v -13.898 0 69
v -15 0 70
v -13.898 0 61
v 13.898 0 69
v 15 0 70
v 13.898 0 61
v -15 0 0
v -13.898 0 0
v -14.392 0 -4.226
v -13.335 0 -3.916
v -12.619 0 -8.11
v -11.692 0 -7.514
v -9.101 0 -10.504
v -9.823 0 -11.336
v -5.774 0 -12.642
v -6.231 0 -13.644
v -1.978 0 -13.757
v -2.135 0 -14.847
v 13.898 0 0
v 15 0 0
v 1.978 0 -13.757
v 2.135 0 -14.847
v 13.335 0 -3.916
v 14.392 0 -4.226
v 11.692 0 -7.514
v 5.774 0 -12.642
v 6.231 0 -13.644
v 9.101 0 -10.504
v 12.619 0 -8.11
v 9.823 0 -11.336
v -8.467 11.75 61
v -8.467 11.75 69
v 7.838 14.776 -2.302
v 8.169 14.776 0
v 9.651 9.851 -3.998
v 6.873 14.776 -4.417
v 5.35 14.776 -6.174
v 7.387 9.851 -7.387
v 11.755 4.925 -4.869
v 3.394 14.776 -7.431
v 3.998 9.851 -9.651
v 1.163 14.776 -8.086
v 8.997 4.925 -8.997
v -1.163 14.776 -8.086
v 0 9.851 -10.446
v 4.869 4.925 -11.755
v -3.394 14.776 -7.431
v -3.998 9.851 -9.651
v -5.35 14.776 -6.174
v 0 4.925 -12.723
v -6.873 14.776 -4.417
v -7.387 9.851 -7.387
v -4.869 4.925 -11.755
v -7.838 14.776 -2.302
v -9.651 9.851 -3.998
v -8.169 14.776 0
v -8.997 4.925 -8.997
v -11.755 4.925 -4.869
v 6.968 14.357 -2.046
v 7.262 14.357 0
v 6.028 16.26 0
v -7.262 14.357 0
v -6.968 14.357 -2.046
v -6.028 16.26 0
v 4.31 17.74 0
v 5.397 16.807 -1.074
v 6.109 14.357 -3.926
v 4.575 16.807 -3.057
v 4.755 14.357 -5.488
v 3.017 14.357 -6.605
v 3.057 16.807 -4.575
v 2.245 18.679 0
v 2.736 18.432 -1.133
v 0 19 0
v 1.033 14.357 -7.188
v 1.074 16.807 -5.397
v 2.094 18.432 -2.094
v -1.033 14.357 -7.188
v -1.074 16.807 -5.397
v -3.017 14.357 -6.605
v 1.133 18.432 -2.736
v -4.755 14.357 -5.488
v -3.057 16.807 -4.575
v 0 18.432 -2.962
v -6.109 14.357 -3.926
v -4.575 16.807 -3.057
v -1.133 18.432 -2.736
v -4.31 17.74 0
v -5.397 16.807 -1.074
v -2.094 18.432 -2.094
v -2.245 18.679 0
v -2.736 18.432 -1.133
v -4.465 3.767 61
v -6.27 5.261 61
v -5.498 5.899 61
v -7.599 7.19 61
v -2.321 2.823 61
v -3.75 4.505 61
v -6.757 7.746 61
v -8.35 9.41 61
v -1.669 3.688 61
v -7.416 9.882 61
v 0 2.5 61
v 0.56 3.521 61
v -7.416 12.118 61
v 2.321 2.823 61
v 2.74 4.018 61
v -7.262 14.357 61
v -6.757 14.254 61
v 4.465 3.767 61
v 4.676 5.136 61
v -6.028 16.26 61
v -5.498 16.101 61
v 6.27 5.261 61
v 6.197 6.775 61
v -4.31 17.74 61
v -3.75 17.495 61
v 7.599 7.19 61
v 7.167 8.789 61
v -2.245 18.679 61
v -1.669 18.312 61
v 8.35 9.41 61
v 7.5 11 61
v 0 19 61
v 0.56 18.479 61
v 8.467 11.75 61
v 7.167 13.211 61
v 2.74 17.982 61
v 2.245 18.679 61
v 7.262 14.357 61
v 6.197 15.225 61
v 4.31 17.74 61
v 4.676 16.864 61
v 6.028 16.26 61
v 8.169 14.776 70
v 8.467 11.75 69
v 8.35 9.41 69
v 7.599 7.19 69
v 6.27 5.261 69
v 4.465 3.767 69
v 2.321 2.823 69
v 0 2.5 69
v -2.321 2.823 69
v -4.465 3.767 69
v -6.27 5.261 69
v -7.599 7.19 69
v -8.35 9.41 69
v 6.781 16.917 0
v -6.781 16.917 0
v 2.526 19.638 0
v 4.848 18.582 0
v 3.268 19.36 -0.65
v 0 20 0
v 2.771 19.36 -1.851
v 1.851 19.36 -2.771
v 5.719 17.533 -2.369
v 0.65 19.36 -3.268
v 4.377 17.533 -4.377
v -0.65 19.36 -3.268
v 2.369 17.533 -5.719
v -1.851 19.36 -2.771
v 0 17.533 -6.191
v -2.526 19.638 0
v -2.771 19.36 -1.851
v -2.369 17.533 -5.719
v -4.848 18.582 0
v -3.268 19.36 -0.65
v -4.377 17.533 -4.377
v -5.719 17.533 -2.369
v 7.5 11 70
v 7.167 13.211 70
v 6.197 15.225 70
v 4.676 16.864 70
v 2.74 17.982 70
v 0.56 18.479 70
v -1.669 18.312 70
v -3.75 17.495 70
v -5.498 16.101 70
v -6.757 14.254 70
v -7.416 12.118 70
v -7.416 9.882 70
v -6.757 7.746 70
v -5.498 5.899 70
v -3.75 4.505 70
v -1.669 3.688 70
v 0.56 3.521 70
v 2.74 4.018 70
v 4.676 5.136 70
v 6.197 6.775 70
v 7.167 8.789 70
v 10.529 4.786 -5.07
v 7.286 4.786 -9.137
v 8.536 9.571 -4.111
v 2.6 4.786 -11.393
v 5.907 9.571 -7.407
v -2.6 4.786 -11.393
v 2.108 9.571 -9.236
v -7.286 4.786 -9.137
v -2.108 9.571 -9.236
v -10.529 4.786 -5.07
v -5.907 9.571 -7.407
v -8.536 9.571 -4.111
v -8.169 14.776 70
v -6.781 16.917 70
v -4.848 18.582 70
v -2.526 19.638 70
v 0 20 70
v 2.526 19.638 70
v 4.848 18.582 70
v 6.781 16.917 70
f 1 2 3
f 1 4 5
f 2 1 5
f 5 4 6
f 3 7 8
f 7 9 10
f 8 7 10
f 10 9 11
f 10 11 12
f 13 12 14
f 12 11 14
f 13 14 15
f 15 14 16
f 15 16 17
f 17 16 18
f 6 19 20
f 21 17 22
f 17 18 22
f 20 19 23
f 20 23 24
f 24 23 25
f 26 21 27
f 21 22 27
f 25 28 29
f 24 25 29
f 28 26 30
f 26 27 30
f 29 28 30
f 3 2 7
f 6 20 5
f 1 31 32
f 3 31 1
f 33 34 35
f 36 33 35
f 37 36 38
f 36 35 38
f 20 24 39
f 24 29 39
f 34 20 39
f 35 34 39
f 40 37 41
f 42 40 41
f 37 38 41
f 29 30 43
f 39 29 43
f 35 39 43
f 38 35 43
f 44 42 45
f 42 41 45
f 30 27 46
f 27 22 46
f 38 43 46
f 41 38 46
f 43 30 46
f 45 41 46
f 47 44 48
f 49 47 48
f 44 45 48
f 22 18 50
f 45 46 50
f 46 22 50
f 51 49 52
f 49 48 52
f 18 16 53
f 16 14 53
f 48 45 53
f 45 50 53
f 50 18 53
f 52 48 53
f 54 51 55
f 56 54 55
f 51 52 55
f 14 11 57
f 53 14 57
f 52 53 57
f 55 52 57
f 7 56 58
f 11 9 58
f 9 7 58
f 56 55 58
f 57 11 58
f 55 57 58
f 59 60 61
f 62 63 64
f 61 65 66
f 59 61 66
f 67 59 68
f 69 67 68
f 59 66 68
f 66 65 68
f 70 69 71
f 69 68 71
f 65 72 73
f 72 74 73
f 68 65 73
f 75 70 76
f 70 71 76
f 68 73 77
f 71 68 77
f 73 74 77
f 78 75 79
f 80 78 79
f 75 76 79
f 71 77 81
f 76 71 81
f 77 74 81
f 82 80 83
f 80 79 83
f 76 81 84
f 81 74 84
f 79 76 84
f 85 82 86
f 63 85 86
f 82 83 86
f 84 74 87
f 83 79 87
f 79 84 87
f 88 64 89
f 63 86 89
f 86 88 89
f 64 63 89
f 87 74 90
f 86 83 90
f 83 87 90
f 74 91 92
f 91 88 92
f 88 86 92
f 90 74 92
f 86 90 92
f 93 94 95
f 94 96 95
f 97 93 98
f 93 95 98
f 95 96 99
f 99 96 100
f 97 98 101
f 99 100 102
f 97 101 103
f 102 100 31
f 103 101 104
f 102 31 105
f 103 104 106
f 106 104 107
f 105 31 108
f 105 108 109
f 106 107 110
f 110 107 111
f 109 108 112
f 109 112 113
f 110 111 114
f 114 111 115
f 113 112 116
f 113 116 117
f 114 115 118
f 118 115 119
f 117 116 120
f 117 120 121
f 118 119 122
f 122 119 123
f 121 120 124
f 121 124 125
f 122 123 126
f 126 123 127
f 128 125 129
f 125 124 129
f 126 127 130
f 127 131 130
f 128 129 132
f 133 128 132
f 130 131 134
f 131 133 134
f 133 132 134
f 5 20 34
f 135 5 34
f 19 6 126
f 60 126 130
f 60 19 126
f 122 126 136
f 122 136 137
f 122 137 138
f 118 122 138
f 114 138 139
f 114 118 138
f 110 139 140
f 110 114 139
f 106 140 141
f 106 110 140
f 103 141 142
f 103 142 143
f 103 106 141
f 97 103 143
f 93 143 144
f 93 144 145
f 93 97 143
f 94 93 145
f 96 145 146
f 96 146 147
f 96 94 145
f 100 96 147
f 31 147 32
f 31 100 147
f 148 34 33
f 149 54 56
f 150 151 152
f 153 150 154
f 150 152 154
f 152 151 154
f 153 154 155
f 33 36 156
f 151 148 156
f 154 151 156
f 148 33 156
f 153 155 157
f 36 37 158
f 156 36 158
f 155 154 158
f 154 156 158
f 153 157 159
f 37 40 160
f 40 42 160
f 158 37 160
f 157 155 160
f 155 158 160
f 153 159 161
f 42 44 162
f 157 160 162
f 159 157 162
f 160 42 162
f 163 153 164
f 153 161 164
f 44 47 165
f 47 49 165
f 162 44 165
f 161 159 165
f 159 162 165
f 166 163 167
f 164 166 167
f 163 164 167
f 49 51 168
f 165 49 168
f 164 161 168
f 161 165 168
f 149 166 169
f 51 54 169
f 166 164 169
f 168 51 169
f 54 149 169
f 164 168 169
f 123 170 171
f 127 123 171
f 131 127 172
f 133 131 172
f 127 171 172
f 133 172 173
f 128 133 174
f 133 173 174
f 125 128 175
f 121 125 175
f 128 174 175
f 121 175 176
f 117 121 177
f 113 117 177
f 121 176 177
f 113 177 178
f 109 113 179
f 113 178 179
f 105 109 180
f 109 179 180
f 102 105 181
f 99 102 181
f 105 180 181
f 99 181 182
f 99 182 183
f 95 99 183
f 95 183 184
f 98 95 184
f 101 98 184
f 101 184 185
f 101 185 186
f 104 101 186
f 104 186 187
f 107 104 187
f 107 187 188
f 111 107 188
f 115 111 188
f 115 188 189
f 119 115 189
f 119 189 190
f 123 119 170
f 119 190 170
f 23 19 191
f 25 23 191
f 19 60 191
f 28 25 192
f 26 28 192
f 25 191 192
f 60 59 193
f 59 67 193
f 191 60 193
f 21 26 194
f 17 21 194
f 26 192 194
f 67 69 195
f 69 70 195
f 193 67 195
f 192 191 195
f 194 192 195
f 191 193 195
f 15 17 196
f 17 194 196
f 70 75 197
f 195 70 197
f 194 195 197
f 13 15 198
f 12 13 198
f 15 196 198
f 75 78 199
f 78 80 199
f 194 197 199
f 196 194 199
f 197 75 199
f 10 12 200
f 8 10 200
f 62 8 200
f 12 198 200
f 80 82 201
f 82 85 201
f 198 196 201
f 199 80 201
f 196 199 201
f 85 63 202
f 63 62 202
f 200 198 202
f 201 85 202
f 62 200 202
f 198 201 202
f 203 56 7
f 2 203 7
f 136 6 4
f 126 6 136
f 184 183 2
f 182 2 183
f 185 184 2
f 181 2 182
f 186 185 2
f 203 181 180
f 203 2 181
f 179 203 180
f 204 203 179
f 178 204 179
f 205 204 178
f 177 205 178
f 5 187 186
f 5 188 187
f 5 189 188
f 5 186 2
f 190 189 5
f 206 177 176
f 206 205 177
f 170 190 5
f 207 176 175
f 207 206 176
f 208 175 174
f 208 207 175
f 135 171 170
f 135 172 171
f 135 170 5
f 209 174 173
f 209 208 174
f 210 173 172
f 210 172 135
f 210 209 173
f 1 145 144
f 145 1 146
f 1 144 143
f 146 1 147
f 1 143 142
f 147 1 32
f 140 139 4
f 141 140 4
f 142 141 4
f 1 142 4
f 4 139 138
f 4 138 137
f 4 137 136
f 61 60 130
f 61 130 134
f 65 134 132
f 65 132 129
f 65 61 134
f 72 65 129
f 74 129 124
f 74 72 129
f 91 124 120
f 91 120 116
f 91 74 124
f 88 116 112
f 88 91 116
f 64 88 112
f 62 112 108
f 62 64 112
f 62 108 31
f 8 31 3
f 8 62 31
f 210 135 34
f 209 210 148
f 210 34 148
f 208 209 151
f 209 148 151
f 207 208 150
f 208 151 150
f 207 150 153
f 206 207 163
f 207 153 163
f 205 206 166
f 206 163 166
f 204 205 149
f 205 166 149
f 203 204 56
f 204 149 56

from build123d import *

# Parameters (mm, degrees)
REVOLVE1_ANGLE      = 180
BOSS_EXTRUDE1_DEPTH = 70
SKETCH4_R           = 7.5
CUT_EXTRUDE1_DEPTH  = 9
SHELL1_DEPTH        = 61
SHELL1_START        = 61
SHELL1_2_DEPTH      = 8
SHELL1_3_ANGLE      = 180


with BuildPart() as part:
    # Sketch2 → Revolve1 (revolve)
    with BuildSketch(Plane.XY):
        with BuildLine():
            Line((0, 0), (0, 20))
            ThreePointArc((0, 20), (4.848310738, 18.582472089), (8.169373523, 14.776418441))
            Line((8.169373523, 14.776418441), (15, 0))
            Line((15, 0), (0, 0))
        make_face()
    revolve(axis=Axis((0, 0, 0), (0, 1, 0)), revolution_arc=REVOLVE1_ANGLE)

    # Sketch3 → Boss-Extrude1 (add)
    with BuildSketch(Plane.XY):
        with BuildLine():
            Line((-15, 0), (15, 0))
            Line((15, 0), (8.169373523, 14.776418441))
            ThreePointArc((8.169373523, 14.776418441), (0, 20), (-8.169373523, 14.776418441))
            Line((-8.169373523, 14.776418441), (-15, 0))
        make_face()
    extrude(amount=BOSS_EXTRUDE1_DEPTH)

    # Sketch4 → Cut-Extrude1 (cut)
    with BuildSketch(Plane.XY.offset(70)):
        with Locations((0, 11)):
            Circle(SKETCH4_R)
    extrude(amount=-CUT_EXTRUDE1_DEPTH, mode=Mode.SUBTRACT)

    # Shell1: read off the stored shape, not the designer's step
    # Shell1 outline → Shell1 (cut)
    with BuildSketch(Plane.XY):
        with BuildLine():
            Line((-13.898324336, 0), (13.898324336, 0))
            Line((13.898324336, 0), (7.261665354, 14.356816392))
            ThreePointArc((7.261665354, 14.356816392), (0, 19), (-7.261665354, 14.356816392))
            Line((-7.261665354, 14.356816392), (-13.898324336, 0))
        make_face()
    extrude(amount=SHELL1_DEPTH, mode=Mode.SUBTRACT)

    # Shell1 2 outline → Shell1 2 (cut)
    with BuildSketch(Plane.XY.offset(SHELL1_START)):
        with BuildLine():
            Line((-8.466880482, 11.74962317), (-13.898324336, 0))
            Line((-13.898324336, 0), (13.898324336, 0))
            Line((13.898324336, 0), (8.466880482, 11.74962317))
            ThreePointArc((8.466880482, 11.74962317), (0, 2.5), (-8.466880482, 11.74962317))
        make_face()
    extrude(amount=SHELL1_2_DEPTH, mode=Mode.SUBTRACT)

    # Shell1 3 outline → Shell1 3 (revolve, cut)
    with BuildSketch(Plane.XY):
        with BuildLine():
            Line((13.898324336, 0), (7.261665354, 14.356816392))
            ThreePointArc((7.261665354, 14.356816392), (4.309609545, 17.73997519), (0, 19))
            Line((0, 19), (0, 0))
            Line((0, 0), (13.898324336, 0))
        make_face()
    revolve(axis=Axis((0, 0, 0), (0, 1, 0)), revolution_arc=SHELL1_3_ANGLE, mode=Mode.SUBTRACT)


solid = part.part
